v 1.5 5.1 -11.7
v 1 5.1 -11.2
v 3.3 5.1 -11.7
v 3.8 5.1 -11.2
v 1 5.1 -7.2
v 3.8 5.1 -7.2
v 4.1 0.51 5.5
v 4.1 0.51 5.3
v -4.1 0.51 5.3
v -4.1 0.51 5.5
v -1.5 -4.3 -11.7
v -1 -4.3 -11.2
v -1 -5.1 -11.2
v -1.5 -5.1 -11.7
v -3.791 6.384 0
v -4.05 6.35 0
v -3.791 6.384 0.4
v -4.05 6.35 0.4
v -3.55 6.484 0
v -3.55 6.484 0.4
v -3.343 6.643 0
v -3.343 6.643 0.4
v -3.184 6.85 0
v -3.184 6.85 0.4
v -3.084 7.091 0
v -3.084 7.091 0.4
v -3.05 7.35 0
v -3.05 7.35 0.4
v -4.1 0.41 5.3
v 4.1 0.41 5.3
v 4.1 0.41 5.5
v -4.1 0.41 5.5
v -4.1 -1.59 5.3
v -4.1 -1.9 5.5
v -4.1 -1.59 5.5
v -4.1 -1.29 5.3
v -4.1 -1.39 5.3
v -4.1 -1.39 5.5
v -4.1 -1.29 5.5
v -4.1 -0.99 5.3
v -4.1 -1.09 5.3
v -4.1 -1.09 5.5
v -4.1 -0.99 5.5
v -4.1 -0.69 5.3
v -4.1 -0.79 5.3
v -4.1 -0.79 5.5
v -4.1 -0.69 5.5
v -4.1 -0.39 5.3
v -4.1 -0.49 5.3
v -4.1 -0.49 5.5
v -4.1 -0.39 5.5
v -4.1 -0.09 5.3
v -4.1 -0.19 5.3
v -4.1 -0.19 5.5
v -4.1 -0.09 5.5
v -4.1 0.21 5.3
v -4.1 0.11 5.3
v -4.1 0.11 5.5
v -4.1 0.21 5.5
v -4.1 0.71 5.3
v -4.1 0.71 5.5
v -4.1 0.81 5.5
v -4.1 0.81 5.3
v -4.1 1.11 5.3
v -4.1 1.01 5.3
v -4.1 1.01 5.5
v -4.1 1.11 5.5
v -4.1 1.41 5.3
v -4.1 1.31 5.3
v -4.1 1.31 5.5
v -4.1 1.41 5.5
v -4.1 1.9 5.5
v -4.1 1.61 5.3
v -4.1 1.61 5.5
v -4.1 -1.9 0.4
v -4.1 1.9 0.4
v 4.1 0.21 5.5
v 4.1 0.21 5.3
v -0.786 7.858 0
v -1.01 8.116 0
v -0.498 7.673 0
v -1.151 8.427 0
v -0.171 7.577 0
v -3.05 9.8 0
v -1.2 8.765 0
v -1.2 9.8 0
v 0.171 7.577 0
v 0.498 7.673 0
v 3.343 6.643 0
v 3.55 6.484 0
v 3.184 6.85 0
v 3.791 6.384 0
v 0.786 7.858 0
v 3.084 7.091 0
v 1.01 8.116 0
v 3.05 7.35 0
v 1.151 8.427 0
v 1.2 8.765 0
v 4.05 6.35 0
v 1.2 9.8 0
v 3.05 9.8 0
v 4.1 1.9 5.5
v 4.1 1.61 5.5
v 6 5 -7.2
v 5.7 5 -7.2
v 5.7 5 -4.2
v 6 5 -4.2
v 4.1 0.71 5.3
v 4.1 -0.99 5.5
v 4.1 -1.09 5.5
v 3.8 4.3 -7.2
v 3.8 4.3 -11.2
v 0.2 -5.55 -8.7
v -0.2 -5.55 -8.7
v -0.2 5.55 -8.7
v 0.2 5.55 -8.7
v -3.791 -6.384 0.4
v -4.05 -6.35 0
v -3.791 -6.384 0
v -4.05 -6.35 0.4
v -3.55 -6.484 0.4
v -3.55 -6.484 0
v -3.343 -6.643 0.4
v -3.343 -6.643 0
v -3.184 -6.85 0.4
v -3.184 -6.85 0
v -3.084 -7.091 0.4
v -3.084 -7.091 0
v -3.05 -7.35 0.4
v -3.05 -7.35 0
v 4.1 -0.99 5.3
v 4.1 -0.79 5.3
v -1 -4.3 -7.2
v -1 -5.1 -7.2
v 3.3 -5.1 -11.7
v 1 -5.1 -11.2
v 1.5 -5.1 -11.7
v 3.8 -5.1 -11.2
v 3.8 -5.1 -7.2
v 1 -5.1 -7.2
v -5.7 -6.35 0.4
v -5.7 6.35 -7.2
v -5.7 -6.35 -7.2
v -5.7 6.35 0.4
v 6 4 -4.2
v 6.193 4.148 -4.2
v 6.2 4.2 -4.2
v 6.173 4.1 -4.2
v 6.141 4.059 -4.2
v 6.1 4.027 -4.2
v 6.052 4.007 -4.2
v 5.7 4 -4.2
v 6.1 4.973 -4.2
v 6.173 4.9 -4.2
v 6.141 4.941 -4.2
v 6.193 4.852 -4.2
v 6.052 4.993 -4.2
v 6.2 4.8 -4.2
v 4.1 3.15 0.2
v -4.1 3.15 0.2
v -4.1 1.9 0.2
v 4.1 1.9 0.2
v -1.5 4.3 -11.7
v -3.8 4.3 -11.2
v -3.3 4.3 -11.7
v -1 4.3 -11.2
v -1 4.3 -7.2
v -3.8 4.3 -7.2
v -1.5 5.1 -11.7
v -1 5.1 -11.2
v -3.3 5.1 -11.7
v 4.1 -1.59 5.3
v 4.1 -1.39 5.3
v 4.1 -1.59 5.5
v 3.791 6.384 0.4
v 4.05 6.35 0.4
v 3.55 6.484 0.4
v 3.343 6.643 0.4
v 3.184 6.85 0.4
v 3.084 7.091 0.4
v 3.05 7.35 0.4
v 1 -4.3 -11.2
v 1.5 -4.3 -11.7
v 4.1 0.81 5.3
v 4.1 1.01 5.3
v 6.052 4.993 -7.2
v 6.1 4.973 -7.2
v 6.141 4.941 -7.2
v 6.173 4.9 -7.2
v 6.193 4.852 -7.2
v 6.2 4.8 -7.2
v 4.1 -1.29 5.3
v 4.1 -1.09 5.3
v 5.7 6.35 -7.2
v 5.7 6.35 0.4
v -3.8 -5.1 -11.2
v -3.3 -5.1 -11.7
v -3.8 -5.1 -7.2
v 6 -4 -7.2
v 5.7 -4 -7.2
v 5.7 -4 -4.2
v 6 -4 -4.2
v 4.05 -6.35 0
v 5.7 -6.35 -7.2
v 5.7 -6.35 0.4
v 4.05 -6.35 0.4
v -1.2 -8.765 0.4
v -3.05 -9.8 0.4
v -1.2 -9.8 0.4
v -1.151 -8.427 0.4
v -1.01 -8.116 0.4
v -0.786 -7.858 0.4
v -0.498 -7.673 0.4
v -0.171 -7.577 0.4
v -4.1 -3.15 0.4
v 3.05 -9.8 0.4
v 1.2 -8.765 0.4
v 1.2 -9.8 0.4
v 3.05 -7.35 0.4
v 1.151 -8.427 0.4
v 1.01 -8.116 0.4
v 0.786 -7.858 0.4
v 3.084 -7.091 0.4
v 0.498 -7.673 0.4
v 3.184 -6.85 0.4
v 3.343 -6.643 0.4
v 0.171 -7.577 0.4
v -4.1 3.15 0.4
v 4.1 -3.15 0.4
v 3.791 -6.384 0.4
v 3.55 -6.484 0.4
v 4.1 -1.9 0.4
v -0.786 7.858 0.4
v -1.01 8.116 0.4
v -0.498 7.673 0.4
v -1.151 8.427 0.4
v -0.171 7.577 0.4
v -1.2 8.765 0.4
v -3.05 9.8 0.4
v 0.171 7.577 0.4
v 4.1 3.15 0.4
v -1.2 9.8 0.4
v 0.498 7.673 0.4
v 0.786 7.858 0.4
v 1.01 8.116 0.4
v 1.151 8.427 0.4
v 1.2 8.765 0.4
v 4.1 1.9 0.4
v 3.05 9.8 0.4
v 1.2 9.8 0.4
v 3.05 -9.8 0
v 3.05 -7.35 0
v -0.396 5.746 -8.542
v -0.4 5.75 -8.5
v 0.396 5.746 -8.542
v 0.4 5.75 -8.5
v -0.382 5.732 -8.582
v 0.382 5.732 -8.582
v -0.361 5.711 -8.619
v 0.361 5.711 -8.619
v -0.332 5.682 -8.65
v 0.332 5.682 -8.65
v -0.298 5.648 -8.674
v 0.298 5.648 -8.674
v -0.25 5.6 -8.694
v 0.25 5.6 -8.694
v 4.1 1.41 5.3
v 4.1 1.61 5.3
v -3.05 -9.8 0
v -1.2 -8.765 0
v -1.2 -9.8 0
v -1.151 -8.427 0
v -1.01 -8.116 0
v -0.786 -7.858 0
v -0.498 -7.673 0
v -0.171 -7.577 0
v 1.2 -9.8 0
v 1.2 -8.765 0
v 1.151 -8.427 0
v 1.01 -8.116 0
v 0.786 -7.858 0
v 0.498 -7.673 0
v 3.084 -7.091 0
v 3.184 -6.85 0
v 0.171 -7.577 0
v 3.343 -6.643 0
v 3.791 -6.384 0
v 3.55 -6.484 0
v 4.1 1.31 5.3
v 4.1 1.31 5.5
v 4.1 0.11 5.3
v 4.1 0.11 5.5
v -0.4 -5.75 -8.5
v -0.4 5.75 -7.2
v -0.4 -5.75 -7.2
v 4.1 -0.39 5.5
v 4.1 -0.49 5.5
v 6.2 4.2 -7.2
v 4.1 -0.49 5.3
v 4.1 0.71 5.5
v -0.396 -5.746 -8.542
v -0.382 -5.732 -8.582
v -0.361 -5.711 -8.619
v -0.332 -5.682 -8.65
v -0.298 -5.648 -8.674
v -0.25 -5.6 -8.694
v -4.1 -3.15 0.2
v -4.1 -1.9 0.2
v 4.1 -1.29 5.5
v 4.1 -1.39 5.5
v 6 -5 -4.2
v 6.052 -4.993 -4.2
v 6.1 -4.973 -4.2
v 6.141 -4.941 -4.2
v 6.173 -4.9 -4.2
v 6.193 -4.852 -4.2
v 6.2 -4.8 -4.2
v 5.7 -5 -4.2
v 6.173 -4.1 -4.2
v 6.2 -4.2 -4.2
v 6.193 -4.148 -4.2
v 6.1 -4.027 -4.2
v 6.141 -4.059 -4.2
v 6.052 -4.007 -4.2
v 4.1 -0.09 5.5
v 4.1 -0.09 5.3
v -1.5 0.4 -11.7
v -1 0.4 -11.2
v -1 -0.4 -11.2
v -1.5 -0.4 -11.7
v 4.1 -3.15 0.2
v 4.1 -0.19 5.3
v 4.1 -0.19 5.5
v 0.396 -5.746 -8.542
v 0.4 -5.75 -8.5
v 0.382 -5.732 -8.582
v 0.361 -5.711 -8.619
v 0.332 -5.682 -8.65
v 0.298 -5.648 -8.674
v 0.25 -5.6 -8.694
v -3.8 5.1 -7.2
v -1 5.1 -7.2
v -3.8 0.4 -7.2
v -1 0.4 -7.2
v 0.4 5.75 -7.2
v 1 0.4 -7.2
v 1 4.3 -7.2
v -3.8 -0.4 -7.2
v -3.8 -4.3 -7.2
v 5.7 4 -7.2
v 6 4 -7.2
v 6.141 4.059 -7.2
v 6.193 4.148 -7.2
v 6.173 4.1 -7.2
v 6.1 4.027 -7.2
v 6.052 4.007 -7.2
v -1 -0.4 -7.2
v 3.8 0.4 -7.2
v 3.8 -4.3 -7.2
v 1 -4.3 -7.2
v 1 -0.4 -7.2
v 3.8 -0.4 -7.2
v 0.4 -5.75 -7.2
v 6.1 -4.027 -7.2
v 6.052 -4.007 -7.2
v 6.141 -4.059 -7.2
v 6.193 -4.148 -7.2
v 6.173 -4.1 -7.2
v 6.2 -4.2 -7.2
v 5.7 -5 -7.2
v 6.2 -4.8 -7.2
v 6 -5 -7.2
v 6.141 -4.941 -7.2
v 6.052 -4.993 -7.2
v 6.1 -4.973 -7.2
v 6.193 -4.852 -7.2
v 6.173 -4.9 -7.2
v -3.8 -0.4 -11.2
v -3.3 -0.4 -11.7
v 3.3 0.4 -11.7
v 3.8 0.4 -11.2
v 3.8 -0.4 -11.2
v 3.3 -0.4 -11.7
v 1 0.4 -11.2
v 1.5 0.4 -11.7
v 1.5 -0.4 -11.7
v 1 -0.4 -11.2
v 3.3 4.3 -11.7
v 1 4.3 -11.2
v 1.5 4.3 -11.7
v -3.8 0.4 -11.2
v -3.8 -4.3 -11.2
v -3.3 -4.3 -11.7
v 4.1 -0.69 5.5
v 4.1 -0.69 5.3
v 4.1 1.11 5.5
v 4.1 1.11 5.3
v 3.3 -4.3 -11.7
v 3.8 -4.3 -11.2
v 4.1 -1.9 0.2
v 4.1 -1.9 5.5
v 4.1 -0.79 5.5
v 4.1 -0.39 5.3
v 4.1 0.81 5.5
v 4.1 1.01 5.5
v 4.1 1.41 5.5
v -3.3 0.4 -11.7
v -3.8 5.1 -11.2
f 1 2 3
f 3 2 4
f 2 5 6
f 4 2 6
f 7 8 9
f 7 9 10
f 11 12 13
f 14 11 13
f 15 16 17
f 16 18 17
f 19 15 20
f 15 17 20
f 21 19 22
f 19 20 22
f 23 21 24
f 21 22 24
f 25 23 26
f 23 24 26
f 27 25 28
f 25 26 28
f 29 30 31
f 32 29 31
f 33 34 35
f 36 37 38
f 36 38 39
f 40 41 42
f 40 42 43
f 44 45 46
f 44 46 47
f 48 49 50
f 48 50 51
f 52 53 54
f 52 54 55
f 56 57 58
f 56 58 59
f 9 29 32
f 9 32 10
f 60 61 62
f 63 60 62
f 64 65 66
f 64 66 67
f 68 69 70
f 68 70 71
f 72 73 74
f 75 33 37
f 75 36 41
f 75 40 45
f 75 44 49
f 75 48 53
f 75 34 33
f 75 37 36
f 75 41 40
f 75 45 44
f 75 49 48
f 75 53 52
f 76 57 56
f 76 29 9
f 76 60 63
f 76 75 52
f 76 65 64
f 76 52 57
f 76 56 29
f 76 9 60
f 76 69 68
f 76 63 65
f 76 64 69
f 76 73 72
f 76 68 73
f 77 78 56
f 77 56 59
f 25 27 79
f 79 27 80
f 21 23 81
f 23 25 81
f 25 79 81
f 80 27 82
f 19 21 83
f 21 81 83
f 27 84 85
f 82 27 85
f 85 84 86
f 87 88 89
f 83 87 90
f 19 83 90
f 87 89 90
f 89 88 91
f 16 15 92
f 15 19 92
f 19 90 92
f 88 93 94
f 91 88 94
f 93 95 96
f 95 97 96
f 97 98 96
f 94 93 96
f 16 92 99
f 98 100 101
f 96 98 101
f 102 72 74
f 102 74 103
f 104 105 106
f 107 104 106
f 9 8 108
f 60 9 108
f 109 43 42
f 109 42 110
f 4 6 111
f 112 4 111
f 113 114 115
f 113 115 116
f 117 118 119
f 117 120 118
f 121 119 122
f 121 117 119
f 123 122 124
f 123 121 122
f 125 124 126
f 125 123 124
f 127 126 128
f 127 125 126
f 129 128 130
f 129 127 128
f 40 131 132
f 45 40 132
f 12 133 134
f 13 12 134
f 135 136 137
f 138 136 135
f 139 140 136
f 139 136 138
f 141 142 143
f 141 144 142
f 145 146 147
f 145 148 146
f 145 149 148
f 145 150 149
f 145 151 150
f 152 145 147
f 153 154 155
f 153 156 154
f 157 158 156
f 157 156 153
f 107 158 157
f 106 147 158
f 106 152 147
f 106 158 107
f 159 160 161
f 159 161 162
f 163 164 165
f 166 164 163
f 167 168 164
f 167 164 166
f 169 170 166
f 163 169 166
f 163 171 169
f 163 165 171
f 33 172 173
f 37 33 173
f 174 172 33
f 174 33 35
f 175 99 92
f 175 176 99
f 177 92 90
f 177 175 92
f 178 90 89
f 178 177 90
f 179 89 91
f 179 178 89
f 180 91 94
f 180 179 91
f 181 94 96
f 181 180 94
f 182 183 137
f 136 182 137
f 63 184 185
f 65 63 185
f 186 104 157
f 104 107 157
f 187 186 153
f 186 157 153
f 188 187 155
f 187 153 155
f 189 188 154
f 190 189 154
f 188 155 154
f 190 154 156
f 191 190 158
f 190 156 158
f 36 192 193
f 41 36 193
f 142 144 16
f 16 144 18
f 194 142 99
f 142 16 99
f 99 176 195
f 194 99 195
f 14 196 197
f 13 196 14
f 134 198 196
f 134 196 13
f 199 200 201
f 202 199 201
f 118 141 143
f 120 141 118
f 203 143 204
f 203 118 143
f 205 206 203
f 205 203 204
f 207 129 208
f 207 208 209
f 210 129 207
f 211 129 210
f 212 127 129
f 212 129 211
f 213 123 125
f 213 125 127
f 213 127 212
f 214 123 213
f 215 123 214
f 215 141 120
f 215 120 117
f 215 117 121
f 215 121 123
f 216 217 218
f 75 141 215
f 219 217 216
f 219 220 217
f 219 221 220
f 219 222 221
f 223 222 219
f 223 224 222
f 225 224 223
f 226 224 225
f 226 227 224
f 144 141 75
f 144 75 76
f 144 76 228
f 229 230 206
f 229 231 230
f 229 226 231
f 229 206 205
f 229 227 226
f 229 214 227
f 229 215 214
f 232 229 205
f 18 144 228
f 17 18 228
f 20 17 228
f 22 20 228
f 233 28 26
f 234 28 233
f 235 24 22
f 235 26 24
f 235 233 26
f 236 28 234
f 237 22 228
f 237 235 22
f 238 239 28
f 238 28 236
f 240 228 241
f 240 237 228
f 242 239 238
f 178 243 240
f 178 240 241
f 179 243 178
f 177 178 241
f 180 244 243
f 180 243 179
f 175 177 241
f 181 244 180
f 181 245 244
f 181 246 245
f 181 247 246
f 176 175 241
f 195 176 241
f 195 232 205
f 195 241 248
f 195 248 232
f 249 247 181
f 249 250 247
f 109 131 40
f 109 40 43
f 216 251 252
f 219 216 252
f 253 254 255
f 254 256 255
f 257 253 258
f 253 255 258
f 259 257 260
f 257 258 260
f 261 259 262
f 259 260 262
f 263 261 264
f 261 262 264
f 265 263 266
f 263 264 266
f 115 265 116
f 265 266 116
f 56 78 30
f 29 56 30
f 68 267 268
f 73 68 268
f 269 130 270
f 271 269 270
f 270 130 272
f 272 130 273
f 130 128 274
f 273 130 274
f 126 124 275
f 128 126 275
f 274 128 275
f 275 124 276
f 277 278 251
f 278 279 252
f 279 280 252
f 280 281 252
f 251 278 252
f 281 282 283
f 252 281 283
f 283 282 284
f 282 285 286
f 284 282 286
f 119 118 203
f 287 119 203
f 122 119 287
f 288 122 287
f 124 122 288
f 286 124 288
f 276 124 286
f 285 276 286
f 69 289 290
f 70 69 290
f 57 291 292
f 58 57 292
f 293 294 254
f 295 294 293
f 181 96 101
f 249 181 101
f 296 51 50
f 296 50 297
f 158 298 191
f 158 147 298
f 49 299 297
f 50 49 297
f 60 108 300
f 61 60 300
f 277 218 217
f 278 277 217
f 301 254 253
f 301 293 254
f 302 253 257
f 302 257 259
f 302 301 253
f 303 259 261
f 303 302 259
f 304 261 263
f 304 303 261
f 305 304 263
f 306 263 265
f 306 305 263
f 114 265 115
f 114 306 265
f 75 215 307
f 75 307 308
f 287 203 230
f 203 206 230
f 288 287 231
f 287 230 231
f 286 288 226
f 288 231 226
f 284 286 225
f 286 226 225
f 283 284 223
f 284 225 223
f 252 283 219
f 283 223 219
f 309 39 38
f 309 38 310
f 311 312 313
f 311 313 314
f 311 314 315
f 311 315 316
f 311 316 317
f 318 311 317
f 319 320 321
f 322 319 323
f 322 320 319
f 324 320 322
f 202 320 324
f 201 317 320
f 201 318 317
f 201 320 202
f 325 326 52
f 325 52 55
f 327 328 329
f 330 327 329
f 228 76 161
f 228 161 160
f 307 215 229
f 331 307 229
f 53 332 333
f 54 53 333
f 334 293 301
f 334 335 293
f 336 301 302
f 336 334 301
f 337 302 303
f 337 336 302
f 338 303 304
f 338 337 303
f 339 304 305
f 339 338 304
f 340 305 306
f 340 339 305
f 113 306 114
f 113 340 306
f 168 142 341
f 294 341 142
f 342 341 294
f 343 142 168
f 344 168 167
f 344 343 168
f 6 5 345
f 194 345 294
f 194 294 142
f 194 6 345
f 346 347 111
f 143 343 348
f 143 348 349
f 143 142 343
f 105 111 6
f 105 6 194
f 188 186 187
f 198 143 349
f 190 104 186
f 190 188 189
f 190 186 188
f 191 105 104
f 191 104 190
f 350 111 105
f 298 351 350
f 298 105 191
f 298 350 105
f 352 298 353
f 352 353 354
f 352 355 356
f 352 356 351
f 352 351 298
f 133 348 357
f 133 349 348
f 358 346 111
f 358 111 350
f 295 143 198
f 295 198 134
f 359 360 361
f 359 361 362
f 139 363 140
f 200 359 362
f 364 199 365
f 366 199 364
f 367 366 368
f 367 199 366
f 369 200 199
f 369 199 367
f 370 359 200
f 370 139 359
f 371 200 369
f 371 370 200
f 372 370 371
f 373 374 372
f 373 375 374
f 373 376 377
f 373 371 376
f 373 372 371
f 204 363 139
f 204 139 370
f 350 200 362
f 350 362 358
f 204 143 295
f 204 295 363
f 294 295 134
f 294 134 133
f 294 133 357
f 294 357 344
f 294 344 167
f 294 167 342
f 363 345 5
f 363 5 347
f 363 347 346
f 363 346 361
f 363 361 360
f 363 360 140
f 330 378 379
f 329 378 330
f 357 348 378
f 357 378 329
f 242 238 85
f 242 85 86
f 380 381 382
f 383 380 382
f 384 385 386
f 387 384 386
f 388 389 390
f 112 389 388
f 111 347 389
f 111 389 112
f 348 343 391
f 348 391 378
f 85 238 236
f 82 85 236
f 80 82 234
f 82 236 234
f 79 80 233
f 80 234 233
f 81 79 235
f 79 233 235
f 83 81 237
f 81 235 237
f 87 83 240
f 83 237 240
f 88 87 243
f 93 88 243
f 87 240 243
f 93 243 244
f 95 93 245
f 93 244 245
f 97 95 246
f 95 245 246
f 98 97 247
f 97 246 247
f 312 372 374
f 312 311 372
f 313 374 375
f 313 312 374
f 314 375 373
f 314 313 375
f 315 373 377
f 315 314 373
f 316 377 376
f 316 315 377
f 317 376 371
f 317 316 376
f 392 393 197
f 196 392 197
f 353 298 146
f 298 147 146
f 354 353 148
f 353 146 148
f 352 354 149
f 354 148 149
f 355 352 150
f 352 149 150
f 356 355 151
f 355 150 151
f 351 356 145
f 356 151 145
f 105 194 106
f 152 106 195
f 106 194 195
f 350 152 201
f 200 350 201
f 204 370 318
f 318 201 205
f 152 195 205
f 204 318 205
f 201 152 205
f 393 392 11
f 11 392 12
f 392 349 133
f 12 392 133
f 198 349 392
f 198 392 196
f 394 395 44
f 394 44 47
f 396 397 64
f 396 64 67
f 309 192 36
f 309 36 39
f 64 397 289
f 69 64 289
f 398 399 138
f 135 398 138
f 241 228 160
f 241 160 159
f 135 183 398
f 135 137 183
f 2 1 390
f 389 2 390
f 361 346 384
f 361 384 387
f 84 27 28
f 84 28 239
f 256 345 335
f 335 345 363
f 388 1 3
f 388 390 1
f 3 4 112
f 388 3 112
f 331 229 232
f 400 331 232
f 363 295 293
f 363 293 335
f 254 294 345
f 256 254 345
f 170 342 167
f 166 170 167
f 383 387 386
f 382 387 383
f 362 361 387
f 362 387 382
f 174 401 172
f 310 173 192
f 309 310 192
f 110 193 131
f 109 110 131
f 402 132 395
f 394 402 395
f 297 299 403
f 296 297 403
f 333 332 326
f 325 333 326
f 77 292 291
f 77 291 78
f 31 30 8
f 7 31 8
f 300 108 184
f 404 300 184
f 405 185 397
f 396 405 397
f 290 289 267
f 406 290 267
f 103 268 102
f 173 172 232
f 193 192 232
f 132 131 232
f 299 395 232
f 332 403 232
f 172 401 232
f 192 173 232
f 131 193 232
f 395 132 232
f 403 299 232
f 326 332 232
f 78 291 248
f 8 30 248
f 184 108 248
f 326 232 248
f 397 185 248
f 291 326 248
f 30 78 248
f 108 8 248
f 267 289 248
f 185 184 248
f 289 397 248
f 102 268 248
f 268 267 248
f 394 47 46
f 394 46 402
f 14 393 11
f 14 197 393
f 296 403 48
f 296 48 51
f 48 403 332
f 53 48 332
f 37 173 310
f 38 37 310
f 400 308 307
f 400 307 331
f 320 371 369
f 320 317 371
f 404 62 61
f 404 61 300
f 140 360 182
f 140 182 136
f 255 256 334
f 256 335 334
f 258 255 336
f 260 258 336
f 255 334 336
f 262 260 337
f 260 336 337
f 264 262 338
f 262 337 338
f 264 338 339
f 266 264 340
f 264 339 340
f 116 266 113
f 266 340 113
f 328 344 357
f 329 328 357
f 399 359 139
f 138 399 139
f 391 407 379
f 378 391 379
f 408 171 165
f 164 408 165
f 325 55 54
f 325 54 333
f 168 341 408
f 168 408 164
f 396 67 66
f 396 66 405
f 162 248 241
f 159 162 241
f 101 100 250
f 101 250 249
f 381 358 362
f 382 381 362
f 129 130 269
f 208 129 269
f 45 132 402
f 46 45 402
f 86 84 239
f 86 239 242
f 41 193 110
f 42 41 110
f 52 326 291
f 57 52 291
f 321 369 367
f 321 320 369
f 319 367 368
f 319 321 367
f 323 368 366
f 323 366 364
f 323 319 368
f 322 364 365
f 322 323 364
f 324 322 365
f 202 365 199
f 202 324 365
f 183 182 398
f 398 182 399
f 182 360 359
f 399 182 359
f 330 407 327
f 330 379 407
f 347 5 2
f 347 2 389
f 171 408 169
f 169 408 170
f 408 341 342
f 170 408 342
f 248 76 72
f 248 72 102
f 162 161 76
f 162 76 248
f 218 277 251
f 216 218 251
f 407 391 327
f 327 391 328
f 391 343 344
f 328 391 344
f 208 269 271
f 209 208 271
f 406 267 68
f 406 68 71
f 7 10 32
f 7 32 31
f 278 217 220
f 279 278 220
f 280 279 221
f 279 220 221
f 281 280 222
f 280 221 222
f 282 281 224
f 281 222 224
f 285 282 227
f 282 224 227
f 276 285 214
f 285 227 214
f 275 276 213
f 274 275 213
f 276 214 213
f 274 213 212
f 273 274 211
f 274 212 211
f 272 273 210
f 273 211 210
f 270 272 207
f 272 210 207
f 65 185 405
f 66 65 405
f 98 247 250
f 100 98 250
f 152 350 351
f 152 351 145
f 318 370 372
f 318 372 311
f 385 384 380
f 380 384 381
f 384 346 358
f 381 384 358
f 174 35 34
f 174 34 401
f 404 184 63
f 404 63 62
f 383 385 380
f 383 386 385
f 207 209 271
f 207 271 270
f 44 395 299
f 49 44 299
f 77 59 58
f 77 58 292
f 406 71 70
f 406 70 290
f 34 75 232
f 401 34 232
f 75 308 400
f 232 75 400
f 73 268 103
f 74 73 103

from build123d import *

# Parameters (mm, degrees)
F0_W      = 2.65
F0_H      = 12.7
F0_W_2    = 6.1
F0_H_2    = 3.45
F1_DEPTH  = 0.4
F2_W      = 2.4
F2_H      = 1.035
F3_DEPTH  = 1
F4_W      = 8.2
F4_H      = 6.3
F5_DEPTH  = 0.2
F6_W      = 8.2
F6_H      = 3.8
F7_DEPTH  = 5.3
F8_W      = 11.4
F8_H      = 12.7
F9_DEPTH  = 7.2
F10_W     = 1
F10_H     = 3
F11_DEPTH = 0.5
F12_W     = 2.8
F12_H     = 0.8
F13_DEPTH = 4.5
F14_R     = 1
F15_SIZE  = 0.5
F16_W     = 0.8
F16_H     = 11.5
F17_DEPTH = 1.5
F18_R     = 0.2
F19_W     = 0.2
F19_H     = 0.2
F20_DEPTH = 25


with BuildPart() as f1:
    # F0 (on Top) → F1 (new body)
    with BuildSketch(Plane.XY):
        with Locations((4.375, 0)):
            Rectangle(F0_W, F0_H)
        with Locations((0, -8.075)):
            Rectangle(F0_W_2, F0_H_2)
        Rectangle(F0_W_2, F0_H)
        with Locations((-4.375, 0)):
            Rectangle(F0_W, F0_H)
        with Locations((0, 8.075)):
            Rectangle(F0_W_2, F0_H_2)
    extrude(amount=F1_DEPTH)

    # F2 (on face) → F3 (cut)
    with BuildSketch(Plane.XY.offset(0.4)):
        with BuildLine():
            ThreePointArc((-1.2, 8.765), (0, 7.565), (1.2, 8.765))
            Line((1.2, 8.765), (-1.2, 8.765))
        make_face()
        with Locations((0, 9.2825)):
            Rectangle(F2_W, F2_H)
        with BuildLine():
            Line((-1.2, -8.765), (1.2, -8.765))
            ThreePointArc((1.2, -8.765), (0, -7.565), (-1.2, -8.765))
        make_face()
        with Locations((0, -9.2825)):
            Rectangle(F2_W, F2_H)
    extrude(amount=-F3_DEPTH, mode=Mode.SUBTRACT)

    # F4 (on face) → F5 (cut)
    with BuildSketch(Plane.XY.offset(0.4)):
        Rectangle(F4_W, F4_H)
    extrude(amount=-F5_DEPTH, mode=Mode.SUBTRACT)

    # F6 (on face) → F7 (join)
    with BuildSketch(Plane.XY.offset(0.2)):
        Rectangle(F6_W, F6_H)
    extrude(amount=F7_DEPTH)

    # F8 (on face) → F9 (join)
    with BuildSketch(Plane(origin=(0, 0, 0), x_dir=(1, 0, 0), z_dir=(0, 0, -1))):
        Rectangle(F8_W, F8_H)
    extrude(amount=F9_DEPTH)

    # F10 (on face) → F11 (join)
    with BuildSketch(Plane.YZ.offset(5.7)):
        with Locations((4.5, -5.7)):
            Rectangle(F10_W, F10_H)
        with Locations((-4.5, -5.7)):
            Rectangle(F10_W, F10_H)
    extrude(amount=F11_DEPTH)

    # F12 (on face) → F13 (join)
    with BuildSketch(Plane(origin=(0, 0, -7.2), x_dir=(1, 0, 0), z_dir=(0, 0, -1))):
        with Locations((2.4, -4.7)):
            Rectangle(F12_W, F12_H)
        with Locations((2.4, 0)):
            Rectangle(F12_W, F12_H)
        with Locations((2.4, 4.7)):
            Rectangle(F12_W, F12_H)
        with Locations((-2.4, -4.7)):
            Rectangle(F12_W, F12_H)
        with Locations((-2.4, 0)):
            Rectangle(F12_W, F12_H)
        with Locations((-2.4, 4.7)):
            Rectangle(F12_W, F12_H)
    extrude(amount=F13_DEPTH)

    # F14
    f14_edges = [f1.edges().sort_by_distance(p)[0] for p in [
        (3.05, 6.35, 0.2),
        (-3.05, 6.35, 0.2),
        (3.05, -6.35, 0.2),
        (-3.05, -6.35, 0.2),
    ]]
    fillet(f14_edges, radius=F14_R)

    # F15
    f15_edges = [f1.edges().sort_by_distance(p)[0] for p in [
        (1, 4.7, -11.7),
        (3.8, 4.7, -11.7),
        (-1, 4.7, -11.7),
        (-3.8, 4.7, -11.7),
        (1, 0, -11.7),
        (3.8, 0, -11.7),
        (-1, 0, -11.7),
        (-3.8, 0, -11.7),
        (-3.8, -4.7, -11.7),
        (-1, -4.7, -11.7),
        (1, -4.7, -11.7),
        (3.8, -4.7, -11.7),
    ]]
    chamfer(f15_edges, length=F15_SIZE)

    # F16 (on face) → F17 (join)
    with BuildSketch(Plane(origin=(0, 0, -7.2), x_dir=(1, 0, 0), z_dir=(0, 0, -1))):
        Rectangle(F16_W, F16_H)
    extrude(amount=F17_DEPTH)

    # F18
    f18_edges = [f1.edges().sort_by_distance(p)[0] for p in [
        (0, -5.75, -8.7),
        (0, 5.75, -8.7),
        (0.4, 0, -8.7),
        (-0.4, 0, -8.7),
        (6.2, -5, -5.7),
        (6.2, -4, -5.7),
        (6.2, 5, -5.7),
        (6.2, 4, -5.7),
    ]]
    fillet(f18_edges, radius=F18_R)

    # F19 (on face) → F20 (cut)
    with BuildSketch(Plane.YZ.offset(4.1)):
        with Locations((-1.4904041938, 5.4)):
            Rectangle(F19_W, F19_H)
        with Locations((-1.1904041938, 5.4)):
            Rectangle(F19_W, F19_H)
        with Locations((-0.8904041938, 5.4)):
            Rectangle(F19_W, F19_H)
        with Locations((-0.5904041938, 5.4)):
            Rectangle(F19_W, F19_H)
        with Locations((-0.2904041938, 5.4)):
            Rectangle(F19_W, F19_H)
        with Locations((0.0095958062, 5.4)):
            Rectangle(F19_W, F19_H)
        with Locations((0.3095958062, 5.4)):
            Rectangle(F19_W, F19_H)
        with Locations((0.6095958062, 5.4)):
            Rectangle(F19_W, F19_H)
        with Locations((0.9095958062, 5.4)):
            Rectangle(F19_W, F19_H)
        with Locations((1.2095958062, 5.4)):
            Rectangle(F19_W, F19_H)
        with Locations((1.5095958062, 5.4)):
            Rectangle(F19_W, F19_H)
    extrude(amount=-F20_DEPTH, mode=Mode.SUBTRACT)


solid = f1.part
